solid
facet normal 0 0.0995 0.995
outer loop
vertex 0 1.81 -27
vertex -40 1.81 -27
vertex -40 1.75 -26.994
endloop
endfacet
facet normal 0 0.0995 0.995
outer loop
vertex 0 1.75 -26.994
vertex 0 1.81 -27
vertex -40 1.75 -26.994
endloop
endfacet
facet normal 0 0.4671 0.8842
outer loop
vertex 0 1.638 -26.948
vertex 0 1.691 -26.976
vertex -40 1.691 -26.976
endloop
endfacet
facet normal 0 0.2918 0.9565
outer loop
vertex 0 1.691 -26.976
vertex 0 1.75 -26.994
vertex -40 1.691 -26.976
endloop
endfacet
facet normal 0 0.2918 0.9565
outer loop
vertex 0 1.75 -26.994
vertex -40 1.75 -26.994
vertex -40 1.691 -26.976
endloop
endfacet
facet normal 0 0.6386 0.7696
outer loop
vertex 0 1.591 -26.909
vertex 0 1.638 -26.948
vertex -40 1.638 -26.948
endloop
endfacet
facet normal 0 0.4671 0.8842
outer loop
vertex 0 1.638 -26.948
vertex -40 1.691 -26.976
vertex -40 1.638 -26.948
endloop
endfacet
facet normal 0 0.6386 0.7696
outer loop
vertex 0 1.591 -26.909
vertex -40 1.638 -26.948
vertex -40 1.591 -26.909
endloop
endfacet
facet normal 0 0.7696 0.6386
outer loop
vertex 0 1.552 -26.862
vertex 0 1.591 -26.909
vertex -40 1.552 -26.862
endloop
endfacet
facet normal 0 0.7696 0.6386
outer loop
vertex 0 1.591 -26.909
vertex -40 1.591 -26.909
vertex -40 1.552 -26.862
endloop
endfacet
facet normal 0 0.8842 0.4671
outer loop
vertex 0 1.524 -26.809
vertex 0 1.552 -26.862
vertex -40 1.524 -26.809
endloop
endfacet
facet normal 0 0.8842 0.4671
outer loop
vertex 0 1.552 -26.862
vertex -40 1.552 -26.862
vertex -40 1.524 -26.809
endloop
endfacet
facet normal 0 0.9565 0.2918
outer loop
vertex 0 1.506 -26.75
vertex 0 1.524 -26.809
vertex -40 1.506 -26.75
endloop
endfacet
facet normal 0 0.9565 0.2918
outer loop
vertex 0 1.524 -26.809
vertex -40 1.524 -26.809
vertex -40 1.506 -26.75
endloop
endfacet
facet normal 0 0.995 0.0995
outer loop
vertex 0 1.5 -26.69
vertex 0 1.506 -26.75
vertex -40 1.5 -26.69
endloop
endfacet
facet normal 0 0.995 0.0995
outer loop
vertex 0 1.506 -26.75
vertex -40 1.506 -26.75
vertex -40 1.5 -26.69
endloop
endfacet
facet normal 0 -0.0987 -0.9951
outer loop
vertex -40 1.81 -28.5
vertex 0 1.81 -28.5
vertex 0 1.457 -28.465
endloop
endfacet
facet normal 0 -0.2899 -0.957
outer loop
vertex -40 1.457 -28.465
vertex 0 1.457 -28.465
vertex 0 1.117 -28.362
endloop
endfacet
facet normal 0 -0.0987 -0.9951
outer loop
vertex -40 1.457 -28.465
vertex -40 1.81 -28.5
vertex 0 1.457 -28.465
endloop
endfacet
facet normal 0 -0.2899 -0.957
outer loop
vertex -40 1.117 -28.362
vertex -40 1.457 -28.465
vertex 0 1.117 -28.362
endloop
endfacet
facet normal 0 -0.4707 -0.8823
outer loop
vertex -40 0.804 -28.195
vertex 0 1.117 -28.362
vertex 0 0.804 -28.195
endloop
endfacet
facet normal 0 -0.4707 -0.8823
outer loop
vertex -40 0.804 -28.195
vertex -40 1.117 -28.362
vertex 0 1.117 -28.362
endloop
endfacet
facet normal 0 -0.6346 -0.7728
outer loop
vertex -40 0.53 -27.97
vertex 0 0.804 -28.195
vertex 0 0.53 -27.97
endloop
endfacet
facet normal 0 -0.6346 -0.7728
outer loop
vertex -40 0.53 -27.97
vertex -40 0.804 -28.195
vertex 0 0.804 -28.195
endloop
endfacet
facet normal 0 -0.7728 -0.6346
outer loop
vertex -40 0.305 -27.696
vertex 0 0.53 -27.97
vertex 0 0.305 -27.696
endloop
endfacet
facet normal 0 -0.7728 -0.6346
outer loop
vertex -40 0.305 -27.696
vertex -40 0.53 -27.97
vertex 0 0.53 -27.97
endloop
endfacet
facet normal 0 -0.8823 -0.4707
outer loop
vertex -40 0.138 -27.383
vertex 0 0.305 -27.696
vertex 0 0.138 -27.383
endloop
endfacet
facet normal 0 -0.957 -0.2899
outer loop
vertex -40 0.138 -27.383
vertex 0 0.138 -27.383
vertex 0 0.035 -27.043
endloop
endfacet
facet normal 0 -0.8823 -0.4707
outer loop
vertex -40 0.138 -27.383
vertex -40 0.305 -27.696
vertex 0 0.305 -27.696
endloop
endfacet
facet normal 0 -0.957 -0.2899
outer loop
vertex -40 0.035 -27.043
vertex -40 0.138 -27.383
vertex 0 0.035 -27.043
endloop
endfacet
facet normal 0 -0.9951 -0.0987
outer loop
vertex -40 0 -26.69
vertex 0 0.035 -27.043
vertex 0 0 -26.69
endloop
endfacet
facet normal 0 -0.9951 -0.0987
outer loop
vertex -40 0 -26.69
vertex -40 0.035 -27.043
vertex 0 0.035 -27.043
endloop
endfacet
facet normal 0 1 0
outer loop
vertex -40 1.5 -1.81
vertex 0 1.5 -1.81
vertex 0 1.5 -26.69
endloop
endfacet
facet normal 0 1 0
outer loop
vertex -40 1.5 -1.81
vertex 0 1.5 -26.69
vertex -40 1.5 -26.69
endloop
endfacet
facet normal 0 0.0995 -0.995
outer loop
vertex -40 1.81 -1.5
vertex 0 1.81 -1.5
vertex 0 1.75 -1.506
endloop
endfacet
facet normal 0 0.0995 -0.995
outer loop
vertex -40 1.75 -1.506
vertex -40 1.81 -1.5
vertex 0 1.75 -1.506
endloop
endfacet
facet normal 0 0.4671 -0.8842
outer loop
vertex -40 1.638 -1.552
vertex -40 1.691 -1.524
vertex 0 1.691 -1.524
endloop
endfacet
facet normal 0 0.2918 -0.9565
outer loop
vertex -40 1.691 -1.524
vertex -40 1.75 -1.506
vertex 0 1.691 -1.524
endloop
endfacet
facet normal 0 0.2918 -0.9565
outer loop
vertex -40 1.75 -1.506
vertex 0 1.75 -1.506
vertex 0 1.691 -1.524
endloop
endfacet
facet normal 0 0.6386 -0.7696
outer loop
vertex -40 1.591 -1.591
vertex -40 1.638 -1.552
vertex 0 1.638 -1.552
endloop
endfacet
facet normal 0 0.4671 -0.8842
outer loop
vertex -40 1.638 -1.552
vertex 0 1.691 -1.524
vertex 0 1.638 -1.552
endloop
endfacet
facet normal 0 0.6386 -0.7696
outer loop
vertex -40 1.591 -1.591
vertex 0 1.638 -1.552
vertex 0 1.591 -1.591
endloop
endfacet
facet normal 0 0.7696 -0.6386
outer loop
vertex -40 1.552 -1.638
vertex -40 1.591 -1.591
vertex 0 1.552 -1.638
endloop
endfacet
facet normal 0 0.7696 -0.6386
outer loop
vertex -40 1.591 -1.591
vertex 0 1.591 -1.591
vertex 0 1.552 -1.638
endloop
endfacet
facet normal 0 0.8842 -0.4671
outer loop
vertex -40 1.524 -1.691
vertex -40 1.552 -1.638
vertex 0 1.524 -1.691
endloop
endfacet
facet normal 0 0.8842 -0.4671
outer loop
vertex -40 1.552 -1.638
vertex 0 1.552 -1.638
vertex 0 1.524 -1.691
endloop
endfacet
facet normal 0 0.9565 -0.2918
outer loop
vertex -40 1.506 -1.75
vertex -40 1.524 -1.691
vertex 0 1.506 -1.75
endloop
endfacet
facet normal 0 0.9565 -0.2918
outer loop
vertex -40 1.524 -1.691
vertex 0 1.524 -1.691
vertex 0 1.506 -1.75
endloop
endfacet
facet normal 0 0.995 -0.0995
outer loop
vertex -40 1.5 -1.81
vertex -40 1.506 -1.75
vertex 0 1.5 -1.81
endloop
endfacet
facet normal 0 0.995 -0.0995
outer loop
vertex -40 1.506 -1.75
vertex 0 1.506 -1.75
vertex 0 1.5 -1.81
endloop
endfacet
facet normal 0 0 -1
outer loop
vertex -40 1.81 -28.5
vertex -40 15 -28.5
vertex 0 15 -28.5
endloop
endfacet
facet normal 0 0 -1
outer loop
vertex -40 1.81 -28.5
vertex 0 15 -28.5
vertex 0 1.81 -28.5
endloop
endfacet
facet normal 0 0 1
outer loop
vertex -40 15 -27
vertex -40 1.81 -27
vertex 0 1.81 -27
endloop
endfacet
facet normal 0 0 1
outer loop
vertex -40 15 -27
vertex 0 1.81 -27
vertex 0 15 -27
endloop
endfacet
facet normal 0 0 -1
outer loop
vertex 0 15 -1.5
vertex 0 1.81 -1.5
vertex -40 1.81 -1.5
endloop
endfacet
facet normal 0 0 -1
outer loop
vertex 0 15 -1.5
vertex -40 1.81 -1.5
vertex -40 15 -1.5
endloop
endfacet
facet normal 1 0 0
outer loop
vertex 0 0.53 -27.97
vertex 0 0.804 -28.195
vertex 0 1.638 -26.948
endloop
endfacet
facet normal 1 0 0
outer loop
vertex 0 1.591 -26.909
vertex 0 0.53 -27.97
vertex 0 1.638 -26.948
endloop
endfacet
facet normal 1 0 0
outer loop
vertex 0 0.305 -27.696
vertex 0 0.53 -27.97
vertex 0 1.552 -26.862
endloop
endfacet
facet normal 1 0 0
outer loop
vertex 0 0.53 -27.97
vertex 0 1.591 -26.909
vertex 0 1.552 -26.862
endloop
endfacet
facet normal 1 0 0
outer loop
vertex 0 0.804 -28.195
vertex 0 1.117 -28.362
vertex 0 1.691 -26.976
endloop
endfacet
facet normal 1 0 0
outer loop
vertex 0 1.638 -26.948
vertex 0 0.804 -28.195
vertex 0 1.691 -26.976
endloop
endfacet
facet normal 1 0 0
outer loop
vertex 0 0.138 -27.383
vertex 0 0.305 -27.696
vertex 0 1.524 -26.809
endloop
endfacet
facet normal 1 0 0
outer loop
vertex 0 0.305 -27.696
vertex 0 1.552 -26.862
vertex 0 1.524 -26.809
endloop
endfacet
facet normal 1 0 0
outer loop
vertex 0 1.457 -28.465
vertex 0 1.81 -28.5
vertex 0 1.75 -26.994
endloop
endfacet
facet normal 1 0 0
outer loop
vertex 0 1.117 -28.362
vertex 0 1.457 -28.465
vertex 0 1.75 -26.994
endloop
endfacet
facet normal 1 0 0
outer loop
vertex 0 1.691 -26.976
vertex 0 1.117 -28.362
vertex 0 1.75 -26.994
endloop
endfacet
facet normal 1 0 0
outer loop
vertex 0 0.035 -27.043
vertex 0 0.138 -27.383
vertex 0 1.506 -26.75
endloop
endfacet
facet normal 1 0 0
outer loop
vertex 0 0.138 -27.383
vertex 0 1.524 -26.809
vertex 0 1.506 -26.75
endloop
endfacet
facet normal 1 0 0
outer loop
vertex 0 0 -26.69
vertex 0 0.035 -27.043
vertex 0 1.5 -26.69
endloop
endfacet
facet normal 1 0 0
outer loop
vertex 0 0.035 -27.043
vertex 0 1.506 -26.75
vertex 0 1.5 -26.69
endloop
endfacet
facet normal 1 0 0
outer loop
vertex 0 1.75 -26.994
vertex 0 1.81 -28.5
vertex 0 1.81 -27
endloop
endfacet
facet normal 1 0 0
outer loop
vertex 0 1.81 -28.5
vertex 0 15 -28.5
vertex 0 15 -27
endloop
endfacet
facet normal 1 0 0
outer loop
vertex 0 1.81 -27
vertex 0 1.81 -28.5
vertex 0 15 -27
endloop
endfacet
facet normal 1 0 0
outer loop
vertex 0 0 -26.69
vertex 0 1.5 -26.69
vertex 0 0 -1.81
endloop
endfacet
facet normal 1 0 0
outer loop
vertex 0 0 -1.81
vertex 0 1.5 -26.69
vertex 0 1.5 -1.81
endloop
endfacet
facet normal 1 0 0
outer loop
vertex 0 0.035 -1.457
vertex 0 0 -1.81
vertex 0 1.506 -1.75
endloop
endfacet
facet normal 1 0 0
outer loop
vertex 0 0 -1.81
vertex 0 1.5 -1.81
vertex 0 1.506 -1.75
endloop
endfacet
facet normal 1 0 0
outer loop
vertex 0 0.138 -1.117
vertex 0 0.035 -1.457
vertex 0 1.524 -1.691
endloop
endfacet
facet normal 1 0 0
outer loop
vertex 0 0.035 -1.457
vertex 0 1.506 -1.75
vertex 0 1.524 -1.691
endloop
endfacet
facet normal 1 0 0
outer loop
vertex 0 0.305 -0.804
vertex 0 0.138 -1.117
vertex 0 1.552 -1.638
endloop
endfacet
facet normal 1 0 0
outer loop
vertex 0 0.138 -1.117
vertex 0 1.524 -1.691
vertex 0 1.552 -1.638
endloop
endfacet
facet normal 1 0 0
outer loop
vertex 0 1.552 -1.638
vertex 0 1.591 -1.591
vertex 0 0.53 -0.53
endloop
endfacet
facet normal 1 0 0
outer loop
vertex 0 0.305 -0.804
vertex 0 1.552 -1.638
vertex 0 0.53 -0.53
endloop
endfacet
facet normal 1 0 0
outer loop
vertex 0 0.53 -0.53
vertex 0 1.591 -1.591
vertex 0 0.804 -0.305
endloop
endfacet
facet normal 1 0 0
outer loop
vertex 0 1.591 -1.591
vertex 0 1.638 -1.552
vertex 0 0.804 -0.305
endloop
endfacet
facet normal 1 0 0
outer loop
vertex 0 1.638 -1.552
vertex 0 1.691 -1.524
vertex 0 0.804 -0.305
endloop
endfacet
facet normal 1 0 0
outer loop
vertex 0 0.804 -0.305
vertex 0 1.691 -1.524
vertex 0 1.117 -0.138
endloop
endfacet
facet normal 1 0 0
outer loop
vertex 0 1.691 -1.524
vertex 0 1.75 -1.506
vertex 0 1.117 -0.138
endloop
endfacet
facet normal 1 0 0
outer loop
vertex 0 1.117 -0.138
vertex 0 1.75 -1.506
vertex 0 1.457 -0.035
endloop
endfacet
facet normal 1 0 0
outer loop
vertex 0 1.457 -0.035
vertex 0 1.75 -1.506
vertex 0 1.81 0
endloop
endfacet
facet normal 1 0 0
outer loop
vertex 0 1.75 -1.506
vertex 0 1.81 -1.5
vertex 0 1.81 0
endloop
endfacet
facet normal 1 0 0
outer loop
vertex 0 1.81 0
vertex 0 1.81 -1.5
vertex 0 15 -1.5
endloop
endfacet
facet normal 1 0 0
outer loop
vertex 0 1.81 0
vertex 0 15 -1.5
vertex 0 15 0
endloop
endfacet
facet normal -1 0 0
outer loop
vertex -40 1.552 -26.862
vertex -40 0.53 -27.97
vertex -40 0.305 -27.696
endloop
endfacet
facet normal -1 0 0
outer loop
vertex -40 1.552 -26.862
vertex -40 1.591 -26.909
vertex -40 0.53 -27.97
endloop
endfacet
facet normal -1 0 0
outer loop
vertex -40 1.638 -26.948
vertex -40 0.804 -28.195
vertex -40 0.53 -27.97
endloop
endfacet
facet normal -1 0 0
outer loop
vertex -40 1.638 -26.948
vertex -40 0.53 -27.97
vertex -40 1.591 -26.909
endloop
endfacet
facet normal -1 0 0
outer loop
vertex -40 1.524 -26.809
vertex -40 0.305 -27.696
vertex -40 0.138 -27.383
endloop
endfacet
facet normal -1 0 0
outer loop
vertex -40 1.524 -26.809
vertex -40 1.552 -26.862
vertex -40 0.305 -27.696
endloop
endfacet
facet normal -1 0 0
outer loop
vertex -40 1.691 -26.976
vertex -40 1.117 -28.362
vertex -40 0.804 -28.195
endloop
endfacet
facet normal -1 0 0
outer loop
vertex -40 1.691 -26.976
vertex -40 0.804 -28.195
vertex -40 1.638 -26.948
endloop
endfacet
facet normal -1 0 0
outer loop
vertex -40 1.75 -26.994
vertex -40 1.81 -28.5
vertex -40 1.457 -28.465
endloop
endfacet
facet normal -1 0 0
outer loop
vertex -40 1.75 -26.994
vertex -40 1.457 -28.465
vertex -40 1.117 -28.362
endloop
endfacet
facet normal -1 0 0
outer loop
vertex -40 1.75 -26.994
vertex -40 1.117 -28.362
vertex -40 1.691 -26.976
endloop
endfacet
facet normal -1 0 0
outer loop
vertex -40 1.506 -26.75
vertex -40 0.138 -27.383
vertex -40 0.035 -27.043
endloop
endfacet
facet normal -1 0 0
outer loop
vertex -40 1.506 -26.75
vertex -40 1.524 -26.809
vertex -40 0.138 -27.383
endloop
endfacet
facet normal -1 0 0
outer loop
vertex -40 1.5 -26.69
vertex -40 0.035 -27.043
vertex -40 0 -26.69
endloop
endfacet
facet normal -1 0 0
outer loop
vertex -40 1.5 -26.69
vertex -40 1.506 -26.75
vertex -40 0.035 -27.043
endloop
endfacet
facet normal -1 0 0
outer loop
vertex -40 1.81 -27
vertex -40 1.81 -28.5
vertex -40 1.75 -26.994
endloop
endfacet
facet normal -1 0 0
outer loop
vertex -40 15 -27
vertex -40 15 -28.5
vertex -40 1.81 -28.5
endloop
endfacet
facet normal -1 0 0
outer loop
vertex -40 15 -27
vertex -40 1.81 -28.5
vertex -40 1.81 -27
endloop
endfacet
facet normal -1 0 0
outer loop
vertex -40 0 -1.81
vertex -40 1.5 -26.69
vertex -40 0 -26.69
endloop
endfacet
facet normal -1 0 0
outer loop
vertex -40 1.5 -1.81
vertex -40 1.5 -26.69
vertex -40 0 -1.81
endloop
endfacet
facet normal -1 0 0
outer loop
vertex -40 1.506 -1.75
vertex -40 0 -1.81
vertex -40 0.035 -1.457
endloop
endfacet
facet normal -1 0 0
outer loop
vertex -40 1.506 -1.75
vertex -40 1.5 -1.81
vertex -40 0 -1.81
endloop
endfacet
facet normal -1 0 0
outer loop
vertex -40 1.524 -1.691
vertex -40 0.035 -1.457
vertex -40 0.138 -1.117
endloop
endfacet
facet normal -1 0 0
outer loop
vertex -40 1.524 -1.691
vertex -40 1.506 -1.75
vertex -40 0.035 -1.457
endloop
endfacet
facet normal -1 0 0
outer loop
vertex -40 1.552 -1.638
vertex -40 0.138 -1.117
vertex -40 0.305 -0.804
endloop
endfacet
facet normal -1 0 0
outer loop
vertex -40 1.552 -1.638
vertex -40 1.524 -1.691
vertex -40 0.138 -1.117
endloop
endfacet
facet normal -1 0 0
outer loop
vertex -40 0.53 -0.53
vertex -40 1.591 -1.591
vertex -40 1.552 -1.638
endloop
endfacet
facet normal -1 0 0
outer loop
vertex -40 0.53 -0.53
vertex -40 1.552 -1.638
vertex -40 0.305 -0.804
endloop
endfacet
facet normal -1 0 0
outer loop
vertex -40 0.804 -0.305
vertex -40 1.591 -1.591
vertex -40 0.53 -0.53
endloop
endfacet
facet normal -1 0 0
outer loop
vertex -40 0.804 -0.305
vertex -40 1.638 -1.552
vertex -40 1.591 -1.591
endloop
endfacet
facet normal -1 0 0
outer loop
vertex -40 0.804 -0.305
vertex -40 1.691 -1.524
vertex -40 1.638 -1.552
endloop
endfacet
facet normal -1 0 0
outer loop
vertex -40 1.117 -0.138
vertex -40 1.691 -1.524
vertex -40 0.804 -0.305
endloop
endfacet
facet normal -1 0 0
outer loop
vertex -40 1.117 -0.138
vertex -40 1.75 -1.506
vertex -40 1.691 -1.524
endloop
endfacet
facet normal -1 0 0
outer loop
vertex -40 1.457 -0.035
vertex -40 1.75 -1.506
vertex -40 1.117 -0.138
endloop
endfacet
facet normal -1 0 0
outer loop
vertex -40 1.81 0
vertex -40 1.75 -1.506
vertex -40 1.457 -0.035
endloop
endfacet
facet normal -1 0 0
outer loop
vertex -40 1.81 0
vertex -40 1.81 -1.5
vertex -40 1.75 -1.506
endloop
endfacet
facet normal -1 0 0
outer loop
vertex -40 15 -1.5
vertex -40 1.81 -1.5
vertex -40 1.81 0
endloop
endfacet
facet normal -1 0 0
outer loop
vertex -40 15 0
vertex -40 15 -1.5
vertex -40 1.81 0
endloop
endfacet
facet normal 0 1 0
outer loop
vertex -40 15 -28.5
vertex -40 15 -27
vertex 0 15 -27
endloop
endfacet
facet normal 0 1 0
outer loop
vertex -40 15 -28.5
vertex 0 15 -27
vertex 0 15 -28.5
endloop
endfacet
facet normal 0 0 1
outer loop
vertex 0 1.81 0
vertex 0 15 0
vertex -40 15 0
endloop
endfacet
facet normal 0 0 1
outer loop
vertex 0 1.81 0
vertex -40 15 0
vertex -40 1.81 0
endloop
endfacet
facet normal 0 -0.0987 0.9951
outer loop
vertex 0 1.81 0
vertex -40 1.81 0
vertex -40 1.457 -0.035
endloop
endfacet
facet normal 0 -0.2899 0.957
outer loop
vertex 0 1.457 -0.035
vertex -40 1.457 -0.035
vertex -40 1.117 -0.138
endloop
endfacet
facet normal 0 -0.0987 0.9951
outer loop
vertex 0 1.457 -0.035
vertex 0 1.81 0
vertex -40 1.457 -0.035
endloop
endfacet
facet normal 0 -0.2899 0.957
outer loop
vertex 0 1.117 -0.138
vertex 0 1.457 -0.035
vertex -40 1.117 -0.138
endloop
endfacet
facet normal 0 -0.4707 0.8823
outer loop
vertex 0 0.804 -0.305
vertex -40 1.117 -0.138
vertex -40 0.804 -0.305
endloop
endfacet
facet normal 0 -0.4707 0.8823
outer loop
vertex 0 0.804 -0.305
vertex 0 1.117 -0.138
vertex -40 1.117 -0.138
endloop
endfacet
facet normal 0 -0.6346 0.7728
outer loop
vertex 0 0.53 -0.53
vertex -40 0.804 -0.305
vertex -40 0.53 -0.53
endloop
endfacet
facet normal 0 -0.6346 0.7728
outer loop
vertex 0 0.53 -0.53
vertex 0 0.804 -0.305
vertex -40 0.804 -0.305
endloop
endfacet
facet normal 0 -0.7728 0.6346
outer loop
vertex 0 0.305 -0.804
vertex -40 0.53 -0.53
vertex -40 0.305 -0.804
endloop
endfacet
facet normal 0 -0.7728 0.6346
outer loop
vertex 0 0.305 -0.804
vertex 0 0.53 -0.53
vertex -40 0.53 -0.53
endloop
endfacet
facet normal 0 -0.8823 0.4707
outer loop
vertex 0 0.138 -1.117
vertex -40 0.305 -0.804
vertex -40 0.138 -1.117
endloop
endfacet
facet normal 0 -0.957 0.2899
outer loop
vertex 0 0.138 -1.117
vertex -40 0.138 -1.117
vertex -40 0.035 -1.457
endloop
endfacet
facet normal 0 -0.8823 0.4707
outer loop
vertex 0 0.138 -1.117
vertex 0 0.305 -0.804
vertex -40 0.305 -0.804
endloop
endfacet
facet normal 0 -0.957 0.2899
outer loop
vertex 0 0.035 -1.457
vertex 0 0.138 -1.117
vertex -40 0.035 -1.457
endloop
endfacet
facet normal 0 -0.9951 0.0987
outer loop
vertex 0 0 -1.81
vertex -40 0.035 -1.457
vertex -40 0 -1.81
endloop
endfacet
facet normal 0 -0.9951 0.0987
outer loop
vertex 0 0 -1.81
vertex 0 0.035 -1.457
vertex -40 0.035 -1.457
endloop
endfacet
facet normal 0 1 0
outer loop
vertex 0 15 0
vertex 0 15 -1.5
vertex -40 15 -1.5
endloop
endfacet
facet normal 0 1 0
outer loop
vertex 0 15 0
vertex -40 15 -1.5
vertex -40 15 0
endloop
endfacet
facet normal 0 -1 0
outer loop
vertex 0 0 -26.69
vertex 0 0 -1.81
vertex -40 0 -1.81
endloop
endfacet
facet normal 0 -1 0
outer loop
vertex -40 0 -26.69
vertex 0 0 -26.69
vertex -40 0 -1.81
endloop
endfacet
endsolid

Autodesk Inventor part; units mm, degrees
ref_plane "YZ Plane" through (0, 0, 0) normal (1, 0, 0) x (0, 1, 0)
ref_plane "XZ Plane" through (0, 0, 0) normal (0, 1, 0) x (-1, 0, 0)
ref_plane "XY Plane" through (0, 0, 0) normal (0, 0, 1) x (1, 0, 0)
sketch "Sketch1" plane through (0, 0, 0) normal (0, 1, 0) x (-1, 0, 0)
  line L0 (0, 0) -> (40, 0)
  line L1 (40, 0) -> (40, -28.5)
  line L2 (40, -28.5) -> (0, -28.5)
  line L3 (0, -28.5) -> (0, 0)
  dimension "d0" = 40
  dimension "d1" = 28.5
extrude "Plate1" add sketch "Sketch1" along normal blind 1.5
sketch "Sketch2" plane through (0, 0, -1.5) normal (0, 0, 1) x (1, 0, 0)
  line L0 (-40, 0) -> (0, 0)
  line L1 (0, 0) -> (0, 15)
  line L2 (0, 15) -> (-40, 15)
  line L3 (-40, 15) -> (-40, 0)
edge flange "Flange1" height 15 angle 90 thickness 1.5 bend radius 0.31 thickness toward (0, 0, 1) relief tear relief width 1.5 relief depth 0.75 edges at (-20, 1.5, 0) wall of the first edge with corners at (-40, 0, -1.5) (0, 0, -1.5) (0, 15, -1.5) (-40, 15, -1.5)
bend "Bend1"
corner "Corner1"
sketch "Sketch3" plane through (-40, 0, -27) normal (0, 0, -1) x (-1, 0, 0)
  line L0 (-40, 0) -> (0, 0)
  line L1 (0, 0) -> (0, 15)
  line L2 (0, 15) -> (-40, 15)
  line L3 (-40, 15) -> (-40, 0)
edge flange "Flange2" height 15 angle 90 thickness 1.5 bend radius 0.31 thickness toward (0, 0, -1) relief tear relief width 1.5 relief depth 0.75 edges at (-20, 1.5, -28.5) wall of the first edge with corners at (0, 0, -27) (-40, 0, -27) (-40, 15, -27) (0, 15, -27)
bend "Bend2"
corner "Corner2"
equation "\"d2\" = Thickness"
equation "\"d3\" = BendReliefWidth"
equation "\"d4\" = BendReliefDepth"
equation "\"d5\" = MinimumRemnant"
equation "\"d6\" = TransitionRadius"
equation "\"d9\" = BendRadius"
equation "\"d10\" = CornerReliefSize"
equation "\"d11\" = GapSize"
equation "\"d12\" = JacobiRadiusSize"
equation "\"d13\" = BendReliefWidth"
equation "\"d14\" = BendReliefDepth"
equation "\"d15\" = MinimumRemnant"
equation "\"d16\" = TransitionRadius"
equation "\"d19\" = BendRadius"
equation "\"d20\" = CornerReliefSize"
equation "\"d21\" = GapSize"
equation "\"d22\" = JacobiRadiusSize"
equation "\"BendReliefWidth\" = Thickness"
equation "\"BendReliefDepth\" = 0.5 * Thickness"
equation "\"CornerReliefSize\" = 4 * Thickness"
equation "\"MinimumRemnant\" = 2 * Thickness"
equation "\"TransitionRadius\" = BendRadius"
equation "\"JacobiRadiusSize\" = BendRadius"
equation "\"GapSize\" = Thickness"
equation "\"Thickness\" = 1.5"
equation "\"BendRadius\" = 0.31"
properties part number "body_motor_frame" material "Aluminum 6061-AHC"
